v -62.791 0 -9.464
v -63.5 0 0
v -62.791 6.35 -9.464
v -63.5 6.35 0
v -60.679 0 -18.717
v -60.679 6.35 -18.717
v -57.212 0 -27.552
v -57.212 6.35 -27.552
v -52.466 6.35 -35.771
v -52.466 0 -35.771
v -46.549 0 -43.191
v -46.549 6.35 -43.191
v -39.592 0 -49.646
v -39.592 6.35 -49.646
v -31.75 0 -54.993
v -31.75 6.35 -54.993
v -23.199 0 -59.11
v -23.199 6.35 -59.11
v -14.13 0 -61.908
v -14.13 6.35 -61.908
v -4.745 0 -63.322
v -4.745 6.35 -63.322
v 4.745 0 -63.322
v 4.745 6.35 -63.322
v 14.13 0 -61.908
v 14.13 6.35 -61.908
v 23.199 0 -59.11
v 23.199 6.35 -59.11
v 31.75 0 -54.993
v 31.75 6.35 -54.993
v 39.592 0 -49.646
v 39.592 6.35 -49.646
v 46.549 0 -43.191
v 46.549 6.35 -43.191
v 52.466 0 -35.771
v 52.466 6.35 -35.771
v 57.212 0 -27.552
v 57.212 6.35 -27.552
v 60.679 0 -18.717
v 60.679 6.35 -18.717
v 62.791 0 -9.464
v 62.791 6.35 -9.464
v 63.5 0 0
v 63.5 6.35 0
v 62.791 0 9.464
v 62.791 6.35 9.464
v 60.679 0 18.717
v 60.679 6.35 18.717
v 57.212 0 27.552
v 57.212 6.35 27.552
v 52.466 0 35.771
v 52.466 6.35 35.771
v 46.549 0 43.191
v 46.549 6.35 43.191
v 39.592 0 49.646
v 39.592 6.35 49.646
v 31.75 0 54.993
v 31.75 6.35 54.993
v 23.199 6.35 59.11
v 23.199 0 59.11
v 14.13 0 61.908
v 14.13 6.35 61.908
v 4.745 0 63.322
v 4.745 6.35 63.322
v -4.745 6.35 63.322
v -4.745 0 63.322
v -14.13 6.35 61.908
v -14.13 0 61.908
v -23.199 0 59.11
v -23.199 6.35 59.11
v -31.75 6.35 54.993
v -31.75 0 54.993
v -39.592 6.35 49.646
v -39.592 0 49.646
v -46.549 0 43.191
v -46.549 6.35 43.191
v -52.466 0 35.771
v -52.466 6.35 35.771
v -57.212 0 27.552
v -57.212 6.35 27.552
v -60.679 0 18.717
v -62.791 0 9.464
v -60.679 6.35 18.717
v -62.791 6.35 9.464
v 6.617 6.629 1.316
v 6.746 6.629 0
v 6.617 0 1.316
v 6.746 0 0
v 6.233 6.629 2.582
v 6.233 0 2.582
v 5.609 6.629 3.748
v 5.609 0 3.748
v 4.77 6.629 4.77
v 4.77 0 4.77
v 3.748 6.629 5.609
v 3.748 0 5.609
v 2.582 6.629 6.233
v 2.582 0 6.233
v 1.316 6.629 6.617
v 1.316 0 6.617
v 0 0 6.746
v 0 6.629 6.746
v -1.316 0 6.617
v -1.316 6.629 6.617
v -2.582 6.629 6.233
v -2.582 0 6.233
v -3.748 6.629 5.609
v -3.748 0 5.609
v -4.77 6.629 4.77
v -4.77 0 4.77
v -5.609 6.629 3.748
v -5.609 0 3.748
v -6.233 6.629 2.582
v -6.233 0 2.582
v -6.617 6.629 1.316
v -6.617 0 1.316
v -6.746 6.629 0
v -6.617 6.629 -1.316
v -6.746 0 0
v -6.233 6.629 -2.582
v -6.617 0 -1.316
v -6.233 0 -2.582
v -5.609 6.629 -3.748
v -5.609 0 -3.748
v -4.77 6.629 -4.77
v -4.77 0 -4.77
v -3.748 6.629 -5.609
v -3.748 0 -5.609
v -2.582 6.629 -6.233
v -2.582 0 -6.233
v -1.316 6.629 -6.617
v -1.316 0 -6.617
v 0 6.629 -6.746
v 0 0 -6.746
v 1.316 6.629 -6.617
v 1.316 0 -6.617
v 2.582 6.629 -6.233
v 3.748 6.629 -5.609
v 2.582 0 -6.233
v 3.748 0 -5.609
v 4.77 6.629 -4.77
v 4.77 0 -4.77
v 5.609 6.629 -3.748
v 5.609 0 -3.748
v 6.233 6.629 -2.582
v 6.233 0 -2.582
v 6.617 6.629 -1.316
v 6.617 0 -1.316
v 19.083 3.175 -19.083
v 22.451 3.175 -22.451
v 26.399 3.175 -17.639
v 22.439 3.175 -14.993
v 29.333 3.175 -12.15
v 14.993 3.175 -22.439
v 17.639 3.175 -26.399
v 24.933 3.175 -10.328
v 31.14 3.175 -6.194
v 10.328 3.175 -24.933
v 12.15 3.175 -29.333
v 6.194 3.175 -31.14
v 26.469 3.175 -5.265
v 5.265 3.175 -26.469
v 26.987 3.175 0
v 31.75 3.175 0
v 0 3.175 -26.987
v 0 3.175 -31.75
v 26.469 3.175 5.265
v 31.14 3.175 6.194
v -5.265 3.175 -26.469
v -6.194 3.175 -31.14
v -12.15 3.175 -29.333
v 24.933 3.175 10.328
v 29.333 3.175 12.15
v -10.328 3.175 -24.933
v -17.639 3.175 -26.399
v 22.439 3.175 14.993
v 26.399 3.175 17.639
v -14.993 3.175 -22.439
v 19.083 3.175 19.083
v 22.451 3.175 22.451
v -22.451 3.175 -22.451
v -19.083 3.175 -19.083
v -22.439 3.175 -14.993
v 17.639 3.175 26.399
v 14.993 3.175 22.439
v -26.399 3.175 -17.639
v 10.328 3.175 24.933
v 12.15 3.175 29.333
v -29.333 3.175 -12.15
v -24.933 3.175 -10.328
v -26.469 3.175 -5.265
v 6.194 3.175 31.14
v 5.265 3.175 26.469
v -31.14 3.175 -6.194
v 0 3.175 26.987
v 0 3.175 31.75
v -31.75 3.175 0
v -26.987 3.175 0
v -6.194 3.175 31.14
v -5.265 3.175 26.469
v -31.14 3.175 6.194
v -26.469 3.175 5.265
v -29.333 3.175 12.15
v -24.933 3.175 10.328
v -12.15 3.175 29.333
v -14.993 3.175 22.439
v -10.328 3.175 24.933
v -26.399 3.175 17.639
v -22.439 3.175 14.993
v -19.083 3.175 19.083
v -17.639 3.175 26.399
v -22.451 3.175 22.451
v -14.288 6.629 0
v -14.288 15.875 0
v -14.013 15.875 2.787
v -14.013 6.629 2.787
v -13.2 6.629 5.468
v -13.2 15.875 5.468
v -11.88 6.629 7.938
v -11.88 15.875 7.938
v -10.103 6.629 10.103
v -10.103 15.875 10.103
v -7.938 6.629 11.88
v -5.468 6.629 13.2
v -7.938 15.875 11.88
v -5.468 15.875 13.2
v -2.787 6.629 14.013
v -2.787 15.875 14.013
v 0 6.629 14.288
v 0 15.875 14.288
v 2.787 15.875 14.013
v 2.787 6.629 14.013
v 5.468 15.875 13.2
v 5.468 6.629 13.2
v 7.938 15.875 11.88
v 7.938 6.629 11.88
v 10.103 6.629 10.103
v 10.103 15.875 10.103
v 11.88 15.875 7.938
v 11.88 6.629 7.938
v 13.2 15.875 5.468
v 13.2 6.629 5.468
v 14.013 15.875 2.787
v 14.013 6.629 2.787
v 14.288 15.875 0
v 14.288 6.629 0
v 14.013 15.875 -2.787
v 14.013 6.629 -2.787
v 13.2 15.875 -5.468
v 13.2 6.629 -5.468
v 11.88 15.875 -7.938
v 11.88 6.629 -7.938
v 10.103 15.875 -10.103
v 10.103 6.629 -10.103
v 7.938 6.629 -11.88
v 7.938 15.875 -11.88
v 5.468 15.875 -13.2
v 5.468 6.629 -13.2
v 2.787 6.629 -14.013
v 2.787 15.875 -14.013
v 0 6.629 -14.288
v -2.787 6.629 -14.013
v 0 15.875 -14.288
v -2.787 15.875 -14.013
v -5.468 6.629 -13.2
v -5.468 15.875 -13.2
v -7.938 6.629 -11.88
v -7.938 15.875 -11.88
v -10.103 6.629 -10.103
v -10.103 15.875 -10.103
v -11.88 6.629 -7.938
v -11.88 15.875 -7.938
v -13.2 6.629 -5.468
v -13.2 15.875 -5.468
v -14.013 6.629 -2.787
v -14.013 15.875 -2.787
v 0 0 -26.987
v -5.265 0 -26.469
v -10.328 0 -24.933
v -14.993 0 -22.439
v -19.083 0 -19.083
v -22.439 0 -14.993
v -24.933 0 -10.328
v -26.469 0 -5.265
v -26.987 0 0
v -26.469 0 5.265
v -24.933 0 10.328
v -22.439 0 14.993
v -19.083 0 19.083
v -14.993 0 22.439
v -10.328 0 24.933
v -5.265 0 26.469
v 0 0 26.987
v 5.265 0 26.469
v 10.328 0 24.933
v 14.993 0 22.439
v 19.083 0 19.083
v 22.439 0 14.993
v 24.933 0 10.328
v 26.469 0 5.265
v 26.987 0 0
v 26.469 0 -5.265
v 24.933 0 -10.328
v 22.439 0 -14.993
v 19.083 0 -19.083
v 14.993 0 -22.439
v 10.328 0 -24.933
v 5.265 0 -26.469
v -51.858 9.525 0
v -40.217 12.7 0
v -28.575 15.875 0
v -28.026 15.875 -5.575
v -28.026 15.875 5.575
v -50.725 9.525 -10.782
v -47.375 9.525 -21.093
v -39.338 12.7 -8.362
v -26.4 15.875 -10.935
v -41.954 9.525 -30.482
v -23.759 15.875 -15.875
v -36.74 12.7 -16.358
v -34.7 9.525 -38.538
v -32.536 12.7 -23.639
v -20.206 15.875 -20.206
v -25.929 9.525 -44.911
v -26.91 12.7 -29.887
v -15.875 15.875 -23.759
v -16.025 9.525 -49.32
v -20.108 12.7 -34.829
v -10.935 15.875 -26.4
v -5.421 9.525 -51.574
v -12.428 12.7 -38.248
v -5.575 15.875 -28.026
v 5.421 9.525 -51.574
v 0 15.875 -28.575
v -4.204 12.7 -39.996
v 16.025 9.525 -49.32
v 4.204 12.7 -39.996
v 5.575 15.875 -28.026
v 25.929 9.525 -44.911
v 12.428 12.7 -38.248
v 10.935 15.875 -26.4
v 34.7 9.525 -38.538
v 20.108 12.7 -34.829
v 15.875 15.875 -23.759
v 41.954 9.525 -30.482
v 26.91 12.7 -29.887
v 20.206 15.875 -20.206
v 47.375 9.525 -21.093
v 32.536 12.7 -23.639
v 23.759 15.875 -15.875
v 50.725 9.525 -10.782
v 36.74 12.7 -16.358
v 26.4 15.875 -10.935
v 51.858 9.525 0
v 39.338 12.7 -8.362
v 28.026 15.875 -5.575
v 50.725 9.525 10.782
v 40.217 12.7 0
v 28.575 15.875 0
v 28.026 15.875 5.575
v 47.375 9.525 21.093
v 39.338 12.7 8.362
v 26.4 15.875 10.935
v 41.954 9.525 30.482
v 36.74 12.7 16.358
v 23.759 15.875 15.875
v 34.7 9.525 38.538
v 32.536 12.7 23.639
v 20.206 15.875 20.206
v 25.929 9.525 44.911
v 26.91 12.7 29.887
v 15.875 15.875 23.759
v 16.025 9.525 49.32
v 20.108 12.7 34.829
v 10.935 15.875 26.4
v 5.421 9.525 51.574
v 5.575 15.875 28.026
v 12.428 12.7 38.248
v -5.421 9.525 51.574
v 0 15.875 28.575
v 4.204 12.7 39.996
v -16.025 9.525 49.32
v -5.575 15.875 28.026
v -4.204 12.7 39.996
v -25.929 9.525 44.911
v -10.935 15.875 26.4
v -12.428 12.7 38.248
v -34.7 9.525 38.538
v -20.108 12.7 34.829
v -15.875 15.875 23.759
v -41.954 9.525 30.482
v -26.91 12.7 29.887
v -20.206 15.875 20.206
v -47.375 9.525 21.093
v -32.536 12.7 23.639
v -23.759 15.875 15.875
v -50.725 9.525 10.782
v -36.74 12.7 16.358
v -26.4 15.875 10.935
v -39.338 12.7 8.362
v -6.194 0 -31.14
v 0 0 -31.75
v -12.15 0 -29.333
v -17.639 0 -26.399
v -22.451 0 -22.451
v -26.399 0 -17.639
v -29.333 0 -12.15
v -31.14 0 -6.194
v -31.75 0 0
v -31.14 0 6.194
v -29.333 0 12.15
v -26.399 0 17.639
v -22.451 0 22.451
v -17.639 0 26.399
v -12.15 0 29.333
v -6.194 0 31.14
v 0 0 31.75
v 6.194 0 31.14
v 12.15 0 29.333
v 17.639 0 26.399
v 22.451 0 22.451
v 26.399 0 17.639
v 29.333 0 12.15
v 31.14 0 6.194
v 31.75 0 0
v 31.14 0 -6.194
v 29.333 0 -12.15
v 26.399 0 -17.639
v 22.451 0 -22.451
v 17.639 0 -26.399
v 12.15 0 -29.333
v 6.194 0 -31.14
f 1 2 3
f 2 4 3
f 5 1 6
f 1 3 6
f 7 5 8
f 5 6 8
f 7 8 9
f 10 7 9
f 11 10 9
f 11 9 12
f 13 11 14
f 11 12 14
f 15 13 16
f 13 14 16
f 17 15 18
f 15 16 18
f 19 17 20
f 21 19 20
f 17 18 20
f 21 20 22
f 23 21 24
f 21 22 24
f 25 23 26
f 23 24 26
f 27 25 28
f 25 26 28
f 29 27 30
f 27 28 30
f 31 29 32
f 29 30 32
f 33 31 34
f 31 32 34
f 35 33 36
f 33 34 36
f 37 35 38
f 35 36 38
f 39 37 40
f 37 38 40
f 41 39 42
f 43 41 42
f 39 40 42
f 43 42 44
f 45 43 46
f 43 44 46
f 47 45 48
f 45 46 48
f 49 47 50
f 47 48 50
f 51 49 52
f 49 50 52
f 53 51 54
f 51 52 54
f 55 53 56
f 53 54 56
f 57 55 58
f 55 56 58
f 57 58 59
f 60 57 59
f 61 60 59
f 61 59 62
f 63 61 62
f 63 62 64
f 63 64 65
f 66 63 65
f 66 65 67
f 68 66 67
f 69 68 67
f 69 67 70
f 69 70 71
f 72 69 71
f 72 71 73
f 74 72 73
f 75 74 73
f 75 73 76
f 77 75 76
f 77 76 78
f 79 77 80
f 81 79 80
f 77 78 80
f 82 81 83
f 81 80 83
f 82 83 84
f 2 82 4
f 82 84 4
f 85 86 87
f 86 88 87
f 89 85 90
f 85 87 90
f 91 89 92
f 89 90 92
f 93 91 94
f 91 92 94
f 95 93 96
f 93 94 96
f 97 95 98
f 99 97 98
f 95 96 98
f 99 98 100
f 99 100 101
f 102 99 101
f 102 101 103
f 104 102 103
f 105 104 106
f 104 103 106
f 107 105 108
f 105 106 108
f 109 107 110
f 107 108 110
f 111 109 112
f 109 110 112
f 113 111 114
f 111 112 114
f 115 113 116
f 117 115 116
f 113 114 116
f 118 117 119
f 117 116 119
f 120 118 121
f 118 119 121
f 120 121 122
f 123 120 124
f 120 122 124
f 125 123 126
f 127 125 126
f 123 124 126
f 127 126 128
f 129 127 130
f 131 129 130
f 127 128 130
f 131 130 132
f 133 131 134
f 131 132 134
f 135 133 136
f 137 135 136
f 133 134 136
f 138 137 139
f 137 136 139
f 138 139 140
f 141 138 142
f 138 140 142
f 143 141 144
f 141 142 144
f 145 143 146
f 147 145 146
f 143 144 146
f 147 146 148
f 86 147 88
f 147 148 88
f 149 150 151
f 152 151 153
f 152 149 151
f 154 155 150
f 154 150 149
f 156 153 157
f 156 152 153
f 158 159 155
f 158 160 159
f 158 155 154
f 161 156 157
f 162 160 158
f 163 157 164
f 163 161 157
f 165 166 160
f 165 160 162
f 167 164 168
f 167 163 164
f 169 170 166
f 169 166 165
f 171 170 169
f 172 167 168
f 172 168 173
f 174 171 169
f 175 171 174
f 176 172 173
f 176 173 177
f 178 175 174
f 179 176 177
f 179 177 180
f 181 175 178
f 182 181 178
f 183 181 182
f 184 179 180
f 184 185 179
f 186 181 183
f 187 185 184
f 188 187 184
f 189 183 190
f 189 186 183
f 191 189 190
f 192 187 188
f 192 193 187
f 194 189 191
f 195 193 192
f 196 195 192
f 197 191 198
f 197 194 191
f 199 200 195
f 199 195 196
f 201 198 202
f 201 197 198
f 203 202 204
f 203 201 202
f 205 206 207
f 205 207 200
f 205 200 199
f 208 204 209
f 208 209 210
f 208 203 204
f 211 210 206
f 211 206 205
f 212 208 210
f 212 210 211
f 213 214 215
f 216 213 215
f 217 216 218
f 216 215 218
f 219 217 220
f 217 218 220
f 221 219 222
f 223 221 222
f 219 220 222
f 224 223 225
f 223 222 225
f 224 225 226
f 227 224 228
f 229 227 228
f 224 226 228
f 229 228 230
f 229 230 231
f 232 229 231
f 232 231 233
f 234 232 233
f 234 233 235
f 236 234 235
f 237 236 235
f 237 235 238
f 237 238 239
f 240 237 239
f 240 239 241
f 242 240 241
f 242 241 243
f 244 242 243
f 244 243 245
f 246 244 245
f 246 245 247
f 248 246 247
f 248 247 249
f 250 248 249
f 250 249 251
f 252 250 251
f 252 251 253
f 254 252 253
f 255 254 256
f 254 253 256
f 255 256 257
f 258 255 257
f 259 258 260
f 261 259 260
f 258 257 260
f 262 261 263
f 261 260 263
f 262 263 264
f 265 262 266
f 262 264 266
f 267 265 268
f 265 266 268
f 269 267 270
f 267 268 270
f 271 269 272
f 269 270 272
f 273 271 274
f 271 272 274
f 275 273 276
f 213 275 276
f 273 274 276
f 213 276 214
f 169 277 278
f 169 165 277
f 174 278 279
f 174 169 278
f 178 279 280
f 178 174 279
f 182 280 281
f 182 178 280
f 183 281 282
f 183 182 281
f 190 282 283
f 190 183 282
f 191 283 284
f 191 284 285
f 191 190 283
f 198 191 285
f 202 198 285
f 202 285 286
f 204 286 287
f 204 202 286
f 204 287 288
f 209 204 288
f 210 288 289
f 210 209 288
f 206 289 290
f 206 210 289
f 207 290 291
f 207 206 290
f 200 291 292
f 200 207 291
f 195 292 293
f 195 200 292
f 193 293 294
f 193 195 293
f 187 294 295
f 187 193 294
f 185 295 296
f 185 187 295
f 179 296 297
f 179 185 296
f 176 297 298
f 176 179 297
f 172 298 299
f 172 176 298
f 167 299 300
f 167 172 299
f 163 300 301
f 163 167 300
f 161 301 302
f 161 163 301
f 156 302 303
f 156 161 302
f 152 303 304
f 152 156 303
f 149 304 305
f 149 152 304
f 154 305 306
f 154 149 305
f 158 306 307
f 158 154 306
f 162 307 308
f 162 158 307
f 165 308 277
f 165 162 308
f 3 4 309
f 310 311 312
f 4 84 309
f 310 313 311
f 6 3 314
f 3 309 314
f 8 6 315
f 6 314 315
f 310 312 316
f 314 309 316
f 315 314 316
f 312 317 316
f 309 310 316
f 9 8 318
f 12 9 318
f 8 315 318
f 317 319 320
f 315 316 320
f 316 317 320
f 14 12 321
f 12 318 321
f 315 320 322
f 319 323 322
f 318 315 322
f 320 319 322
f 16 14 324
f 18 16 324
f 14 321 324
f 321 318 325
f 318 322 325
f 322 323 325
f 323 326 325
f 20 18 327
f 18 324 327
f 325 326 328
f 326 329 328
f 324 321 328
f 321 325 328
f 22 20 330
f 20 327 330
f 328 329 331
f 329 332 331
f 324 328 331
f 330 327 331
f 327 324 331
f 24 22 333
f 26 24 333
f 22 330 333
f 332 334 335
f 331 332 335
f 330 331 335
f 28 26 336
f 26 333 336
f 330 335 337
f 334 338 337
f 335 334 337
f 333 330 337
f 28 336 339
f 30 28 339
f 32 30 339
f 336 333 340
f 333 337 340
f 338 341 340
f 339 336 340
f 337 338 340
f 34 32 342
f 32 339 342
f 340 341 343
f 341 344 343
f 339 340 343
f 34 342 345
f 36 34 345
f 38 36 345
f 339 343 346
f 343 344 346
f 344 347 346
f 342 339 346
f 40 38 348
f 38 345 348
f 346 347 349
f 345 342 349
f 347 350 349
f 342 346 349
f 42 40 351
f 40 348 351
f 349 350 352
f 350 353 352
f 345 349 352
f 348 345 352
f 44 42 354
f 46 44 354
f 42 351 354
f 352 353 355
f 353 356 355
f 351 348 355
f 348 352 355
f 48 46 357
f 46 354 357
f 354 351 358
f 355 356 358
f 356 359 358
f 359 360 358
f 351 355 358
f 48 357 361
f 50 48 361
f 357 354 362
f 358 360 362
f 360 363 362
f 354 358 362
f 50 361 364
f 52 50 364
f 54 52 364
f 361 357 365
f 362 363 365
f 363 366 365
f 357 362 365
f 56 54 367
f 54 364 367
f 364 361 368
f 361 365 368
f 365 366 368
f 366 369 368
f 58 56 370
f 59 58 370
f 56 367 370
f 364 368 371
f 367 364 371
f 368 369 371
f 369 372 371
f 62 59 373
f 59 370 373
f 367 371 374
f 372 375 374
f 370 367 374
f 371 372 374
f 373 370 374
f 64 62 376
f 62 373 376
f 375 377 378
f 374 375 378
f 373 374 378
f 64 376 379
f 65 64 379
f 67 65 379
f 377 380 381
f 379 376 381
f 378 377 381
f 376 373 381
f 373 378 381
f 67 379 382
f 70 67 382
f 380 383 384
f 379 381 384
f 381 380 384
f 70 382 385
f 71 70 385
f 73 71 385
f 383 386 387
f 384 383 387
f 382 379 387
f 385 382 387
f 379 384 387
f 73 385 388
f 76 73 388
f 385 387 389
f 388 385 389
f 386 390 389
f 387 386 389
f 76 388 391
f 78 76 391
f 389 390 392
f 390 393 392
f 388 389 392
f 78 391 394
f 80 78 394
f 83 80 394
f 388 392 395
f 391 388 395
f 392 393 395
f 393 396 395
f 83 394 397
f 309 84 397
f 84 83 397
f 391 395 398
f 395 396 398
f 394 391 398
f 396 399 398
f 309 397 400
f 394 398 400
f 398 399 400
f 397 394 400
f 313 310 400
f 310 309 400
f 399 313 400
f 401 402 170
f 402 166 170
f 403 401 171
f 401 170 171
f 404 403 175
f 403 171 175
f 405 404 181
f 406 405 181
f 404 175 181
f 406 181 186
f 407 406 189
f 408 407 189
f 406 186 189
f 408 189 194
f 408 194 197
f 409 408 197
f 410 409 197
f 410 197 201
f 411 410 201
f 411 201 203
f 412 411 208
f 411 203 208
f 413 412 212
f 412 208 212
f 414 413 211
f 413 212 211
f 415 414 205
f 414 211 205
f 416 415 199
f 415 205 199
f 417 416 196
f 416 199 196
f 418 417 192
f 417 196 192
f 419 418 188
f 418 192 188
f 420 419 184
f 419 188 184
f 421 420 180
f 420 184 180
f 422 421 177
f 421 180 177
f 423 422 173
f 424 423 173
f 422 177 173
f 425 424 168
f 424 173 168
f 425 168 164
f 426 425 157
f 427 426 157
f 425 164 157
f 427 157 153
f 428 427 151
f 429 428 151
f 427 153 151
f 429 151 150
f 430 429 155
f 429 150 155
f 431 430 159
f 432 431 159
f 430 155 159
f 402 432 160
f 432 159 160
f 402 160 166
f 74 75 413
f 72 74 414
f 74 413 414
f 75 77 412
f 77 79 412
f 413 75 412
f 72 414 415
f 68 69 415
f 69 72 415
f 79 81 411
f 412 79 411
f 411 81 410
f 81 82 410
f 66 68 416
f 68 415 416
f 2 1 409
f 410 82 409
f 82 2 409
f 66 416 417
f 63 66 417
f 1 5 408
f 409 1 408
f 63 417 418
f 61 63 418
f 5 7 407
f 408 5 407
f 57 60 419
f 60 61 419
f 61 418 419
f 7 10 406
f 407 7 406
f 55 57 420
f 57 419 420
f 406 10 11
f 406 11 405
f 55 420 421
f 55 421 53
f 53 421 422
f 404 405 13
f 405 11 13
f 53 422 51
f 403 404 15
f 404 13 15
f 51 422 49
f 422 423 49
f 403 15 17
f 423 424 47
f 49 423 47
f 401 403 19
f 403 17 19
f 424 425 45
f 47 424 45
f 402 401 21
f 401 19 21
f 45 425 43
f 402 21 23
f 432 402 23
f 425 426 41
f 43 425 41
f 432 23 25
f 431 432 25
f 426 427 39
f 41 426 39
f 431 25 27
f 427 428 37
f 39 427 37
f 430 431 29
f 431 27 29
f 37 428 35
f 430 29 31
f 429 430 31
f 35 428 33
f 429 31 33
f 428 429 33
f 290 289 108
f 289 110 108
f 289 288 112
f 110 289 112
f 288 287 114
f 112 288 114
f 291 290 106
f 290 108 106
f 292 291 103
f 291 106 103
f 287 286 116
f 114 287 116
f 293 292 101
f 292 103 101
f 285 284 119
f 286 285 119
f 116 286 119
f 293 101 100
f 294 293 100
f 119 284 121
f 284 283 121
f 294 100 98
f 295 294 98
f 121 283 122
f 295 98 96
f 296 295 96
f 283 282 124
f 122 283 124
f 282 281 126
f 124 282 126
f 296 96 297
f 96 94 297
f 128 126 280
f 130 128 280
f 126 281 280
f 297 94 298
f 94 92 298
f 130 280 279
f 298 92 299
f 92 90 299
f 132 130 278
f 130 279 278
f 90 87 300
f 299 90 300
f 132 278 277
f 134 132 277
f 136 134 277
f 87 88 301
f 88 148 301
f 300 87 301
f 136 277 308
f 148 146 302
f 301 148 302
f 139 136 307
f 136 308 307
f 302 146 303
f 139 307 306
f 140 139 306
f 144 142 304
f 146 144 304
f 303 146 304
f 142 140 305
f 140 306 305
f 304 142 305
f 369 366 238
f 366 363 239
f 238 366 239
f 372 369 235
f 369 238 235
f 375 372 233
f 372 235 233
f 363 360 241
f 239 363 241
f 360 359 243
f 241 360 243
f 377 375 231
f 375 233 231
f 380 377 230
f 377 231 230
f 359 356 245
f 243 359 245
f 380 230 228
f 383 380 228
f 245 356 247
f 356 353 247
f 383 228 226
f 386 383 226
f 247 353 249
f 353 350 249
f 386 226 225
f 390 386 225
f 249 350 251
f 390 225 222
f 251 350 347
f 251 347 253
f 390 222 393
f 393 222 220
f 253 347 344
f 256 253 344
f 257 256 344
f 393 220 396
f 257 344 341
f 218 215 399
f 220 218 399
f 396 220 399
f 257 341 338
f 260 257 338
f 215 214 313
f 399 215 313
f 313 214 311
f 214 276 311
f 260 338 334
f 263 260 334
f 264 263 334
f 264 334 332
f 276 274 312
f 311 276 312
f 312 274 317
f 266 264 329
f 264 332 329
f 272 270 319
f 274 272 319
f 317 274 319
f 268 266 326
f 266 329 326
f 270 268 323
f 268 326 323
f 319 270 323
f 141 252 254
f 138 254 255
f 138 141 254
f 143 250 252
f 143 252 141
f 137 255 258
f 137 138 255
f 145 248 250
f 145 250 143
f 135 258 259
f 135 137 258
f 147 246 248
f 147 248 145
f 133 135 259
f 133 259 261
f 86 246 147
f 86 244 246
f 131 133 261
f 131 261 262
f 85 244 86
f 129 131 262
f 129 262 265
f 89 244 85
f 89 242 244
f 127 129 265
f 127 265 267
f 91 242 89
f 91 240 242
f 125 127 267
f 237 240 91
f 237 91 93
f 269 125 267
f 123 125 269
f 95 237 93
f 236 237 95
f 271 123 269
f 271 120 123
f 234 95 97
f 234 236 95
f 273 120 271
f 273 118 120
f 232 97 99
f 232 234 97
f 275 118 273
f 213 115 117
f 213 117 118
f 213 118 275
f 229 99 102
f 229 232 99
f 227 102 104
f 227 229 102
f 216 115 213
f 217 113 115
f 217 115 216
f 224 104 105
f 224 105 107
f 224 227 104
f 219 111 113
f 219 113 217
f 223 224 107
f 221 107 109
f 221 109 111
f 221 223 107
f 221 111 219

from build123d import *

# Parameters (mm, degrees)
SKETCH2_W                                = 4.7625
SKETCH2_H                                = 3.175
CBORE_FOR_1_2_HEX_HEAD_BOLT1_D           = 13.49248
CBORE_FOR_1_2_HEX_HEAD_BOLT1_CBORE_D     = 28.575
CBORE_FOR_1_2_HEX_HEAD_BOLT1_CBORE_DEPTH = 9.2456


with BuildPart() as part:
    # Sketch1 → Base-Revolve (revolve)
    with BuildSketch(Plane.XY, mode=Mode.PRIVATE) as base_revolve_sk:
        Polygon((0, 0), (63.5, 0), (63.5, 6.35), (28.575, 15.875), (0, 15.875), align=None)
    revolve(base_revolve_sk.sketch.rotate(Axis((0, 15.875, 0), (0, -1, 0)), 180), axis=Axis((0, 15.875, 0), (0, -1, 0)))

    # Sketch2 → Groove (revolve, cut)
    with BuildSketch(Plane.XY, mode=Mode.PRIVATE) as groove_sk:
        with Locations((29.36875, 1.5875)):
            Rectangle(SKETCH2_W, SKETCH2_H)
    revolve(groove_sk.sketch.rotate(Axis((0, 0, 0), (0, 1, 0)), 90), axis=Axis((0, 0, 0), (0, 1, 0)), mode=Mode.SUBTRACT)

    # CBORE for 1/2 Hex Head Bolt1 (through all)
    with Locations(Plane(origin=(0, 15.875, 0), x_dir=(-1, 0, 0), z_dir=(0, 1, 0))):
        with Locations((0, 0)):
            CounterBoreHole(CBORE_FOR_1_2_HEX_HEAD_BOLT1_D / 2, CBORE_FOR_1_2_HEX_HEAD_BOLT1_CBORE_D / 2, CBORE_FOR_1_2_HEX_HEAD_BOLT1_CBORE_DEPTH)


solid = part.part
